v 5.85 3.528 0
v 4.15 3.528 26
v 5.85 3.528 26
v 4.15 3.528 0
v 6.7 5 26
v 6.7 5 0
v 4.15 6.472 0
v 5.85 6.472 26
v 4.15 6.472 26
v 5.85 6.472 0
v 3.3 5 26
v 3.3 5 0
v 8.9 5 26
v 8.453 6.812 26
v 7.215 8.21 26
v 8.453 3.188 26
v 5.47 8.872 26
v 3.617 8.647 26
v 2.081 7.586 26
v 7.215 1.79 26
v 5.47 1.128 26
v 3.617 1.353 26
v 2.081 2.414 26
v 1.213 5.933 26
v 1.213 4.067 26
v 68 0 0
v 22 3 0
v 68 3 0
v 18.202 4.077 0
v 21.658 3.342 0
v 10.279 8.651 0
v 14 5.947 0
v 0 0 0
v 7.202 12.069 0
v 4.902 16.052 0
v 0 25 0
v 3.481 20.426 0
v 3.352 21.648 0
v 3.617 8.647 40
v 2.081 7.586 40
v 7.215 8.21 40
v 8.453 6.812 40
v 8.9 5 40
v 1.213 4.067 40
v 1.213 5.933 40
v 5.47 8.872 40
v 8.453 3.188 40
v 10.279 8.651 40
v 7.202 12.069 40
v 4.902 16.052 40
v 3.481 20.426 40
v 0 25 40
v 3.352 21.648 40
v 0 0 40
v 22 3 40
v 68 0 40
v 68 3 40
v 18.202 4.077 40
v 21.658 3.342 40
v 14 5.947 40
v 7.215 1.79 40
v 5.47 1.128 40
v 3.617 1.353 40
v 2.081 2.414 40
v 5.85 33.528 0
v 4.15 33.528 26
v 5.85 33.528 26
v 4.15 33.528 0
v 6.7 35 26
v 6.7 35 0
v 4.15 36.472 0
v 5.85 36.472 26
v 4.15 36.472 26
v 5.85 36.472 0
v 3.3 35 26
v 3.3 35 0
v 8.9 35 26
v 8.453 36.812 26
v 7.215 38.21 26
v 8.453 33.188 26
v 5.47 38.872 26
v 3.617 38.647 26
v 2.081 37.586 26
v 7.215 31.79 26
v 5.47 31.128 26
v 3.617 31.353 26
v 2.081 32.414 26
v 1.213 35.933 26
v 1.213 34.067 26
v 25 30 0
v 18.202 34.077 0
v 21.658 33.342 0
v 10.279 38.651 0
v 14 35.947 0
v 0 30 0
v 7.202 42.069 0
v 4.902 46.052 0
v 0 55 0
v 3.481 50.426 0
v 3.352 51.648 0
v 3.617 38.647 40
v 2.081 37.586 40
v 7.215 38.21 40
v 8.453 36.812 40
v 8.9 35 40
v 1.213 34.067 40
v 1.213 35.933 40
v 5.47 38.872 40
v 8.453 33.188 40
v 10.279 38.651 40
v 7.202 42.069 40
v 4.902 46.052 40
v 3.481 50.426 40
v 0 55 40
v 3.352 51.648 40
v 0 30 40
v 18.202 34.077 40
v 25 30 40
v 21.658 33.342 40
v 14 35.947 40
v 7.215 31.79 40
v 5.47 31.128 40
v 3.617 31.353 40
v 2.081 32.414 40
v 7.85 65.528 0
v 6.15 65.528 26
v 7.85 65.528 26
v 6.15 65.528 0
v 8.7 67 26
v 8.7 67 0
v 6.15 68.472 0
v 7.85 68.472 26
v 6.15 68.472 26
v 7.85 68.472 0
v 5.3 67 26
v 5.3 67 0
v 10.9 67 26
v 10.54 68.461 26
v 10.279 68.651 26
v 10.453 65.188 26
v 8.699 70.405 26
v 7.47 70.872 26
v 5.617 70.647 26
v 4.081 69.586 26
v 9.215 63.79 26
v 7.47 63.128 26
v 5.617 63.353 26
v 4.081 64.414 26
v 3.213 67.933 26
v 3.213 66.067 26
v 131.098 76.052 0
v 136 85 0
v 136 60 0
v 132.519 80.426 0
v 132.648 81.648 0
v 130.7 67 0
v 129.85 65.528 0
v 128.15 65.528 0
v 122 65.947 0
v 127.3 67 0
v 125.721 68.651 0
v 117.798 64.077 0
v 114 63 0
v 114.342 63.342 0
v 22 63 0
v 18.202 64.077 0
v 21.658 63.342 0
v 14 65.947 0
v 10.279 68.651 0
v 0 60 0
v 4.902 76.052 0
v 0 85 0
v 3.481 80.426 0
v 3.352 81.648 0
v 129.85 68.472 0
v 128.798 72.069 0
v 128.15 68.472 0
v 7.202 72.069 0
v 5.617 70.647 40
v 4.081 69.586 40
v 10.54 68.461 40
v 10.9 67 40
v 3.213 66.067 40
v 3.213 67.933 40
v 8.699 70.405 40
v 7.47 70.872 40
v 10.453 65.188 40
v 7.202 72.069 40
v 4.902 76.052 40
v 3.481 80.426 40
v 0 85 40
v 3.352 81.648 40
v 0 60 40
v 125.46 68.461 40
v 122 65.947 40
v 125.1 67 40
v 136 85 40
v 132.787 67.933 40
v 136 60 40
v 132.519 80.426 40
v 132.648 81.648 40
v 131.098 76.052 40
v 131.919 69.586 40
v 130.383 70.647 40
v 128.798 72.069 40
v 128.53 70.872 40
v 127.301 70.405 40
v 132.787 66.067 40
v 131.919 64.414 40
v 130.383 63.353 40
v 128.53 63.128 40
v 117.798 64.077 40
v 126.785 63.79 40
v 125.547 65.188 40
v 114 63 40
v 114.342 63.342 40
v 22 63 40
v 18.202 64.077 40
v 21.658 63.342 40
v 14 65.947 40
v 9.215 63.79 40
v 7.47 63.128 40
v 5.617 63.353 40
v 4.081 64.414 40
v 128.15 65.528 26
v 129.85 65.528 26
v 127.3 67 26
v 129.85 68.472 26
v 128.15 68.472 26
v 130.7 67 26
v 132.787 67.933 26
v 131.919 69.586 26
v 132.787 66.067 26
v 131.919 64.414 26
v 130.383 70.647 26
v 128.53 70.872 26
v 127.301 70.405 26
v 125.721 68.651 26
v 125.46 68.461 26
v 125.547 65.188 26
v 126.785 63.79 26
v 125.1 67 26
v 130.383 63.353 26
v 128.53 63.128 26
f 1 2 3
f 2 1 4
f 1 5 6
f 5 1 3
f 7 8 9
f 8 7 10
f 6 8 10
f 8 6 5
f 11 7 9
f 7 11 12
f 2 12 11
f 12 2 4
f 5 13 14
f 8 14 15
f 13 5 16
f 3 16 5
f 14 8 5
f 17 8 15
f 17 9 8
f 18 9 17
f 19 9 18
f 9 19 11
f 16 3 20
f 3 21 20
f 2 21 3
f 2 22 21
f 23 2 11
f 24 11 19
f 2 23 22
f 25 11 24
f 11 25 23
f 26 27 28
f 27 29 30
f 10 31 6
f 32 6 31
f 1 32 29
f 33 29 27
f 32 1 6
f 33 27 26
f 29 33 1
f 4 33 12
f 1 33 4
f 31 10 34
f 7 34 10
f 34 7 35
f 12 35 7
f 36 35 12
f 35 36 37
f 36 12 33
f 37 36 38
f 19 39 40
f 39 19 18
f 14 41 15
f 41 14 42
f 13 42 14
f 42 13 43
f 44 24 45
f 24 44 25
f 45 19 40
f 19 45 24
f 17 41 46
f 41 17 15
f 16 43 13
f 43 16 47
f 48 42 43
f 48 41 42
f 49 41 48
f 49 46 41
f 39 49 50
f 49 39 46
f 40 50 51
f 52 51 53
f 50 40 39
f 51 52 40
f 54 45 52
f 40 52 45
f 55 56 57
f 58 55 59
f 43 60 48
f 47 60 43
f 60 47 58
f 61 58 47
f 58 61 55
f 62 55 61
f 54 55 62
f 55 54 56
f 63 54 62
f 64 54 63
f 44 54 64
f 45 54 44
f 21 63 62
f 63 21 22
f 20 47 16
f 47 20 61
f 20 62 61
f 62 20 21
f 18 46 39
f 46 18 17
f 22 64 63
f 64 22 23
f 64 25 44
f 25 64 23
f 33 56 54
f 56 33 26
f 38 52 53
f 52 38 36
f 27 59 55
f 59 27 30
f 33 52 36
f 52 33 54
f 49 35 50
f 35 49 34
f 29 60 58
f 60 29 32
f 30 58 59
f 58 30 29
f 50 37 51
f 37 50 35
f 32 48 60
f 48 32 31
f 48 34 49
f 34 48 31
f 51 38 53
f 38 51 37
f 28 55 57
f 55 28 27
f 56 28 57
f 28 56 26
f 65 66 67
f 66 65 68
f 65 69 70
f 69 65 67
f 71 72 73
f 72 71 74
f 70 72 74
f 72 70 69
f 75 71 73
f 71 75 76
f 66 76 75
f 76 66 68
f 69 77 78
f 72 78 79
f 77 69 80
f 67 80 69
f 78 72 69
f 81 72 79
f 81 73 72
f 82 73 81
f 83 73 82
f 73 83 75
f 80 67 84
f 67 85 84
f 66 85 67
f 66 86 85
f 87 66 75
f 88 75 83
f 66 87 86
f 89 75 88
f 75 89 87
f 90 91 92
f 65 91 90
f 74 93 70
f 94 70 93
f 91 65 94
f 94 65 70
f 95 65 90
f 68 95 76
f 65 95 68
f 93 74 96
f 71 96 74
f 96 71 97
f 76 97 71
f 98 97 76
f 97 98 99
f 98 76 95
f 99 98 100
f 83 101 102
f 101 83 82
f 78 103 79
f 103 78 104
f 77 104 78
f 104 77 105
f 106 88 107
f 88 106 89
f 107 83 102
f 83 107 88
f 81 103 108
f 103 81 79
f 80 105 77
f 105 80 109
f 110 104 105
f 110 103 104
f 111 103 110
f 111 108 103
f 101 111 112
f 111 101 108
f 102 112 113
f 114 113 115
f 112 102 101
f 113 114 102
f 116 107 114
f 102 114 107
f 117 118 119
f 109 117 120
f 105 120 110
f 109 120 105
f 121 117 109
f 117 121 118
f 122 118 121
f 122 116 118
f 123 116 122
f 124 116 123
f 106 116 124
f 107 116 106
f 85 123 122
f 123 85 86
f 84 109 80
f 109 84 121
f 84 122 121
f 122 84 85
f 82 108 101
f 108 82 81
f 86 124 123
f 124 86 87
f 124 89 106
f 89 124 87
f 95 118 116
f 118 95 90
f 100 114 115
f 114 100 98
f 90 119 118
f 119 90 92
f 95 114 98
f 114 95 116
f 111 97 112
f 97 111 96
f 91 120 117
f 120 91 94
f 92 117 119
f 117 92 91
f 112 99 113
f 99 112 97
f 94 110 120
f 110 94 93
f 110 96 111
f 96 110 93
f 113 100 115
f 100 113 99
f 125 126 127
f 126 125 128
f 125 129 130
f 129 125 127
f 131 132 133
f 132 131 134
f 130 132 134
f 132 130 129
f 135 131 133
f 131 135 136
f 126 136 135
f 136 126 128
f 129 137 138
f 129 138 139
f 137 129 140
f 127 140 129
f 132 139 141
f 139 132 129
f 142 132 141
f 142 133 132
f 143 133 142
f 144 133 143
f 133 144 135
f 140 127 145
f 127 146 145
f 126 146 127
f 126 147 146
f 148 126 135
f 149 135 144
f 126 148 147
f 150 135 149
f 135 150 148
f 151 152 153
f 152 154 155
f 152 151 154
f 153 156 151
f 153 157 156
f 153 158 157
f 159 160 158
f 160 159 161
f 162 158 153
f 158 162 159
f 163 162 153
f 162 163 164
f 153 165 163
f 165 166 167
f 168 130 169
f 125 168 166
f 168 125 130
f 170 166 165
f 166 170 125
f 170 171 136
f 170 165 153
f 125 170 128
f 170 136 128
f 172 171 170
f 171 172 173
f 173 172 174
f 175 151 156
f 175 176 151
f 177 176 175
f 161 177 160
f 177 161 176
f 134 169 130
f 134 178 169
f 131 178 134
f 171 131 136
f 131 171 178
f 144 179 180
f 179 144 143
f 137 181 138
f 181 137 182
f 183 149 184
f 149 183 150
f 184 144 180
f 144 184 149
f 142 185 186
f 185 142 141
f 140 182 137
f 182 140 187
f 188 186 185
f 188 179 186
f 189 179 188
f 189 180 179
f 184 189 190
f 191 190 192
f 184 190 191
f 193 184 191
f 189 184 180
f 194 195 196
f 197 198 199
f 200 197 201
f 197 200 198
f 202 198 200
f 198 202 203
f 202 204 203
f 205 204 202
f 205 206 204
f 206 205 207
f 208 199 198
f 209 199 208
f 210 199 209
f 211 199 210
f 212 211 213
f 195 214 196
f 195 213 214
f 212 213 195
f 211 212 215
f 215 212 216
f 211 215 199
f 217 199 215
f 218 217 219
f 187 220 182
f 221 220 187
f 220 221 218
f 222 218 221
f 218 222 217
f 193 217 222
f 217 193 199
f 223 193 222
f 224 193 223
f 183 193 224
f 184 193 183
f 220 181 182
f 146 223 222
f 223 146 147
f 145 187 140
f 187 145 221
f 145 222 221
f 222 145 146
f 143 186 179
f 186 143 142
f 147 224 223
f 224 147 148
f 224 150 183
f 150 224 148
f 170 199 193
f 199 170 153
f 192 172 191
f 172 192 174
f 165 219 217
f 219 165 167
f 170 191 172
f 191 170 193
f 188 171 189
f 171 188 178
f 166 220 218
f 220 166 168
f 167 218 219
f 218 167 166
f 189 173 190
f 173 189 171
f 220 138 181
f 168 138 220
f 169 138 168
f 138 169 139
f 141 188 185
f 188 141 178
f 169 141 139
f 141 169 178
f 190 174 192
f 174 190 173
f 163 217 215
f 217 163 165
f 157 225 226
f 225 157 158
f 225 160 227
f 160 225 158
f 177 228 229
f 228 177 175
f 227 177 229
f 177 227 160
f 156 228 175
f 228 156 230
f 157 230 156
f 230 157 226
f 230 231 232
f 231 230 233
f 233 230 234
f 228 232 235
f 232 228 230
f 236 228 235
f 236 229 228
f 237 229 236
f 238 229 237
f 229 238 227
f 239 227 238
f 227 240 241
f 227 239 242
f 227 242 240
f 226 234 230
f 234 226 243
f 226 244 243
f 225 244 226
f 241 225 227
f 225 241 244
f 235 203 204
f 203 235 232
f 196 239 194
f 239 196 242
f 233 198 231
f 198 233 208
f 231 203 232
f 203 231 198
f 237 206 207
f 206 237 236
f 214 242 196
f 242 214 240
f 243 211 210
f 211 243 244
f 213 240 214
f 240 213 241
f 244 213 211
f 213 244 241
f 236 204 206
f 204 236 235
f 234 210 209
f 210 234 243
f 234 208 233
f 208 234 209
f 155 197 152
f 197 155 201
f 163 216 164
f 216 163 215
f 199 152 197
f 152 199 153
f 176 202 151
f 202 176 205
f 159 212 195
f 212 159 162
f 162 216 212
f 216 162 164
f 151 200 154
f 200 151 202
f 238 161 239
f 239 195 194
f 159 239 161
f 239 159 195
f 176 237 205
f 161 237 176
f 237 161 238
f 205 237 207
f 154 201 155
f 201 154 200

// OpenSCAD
// file: fantools.scad
module fan_corner(height=40, screw_height=26, screw_diameter=3.4, screw_head_diameter=7.8, hole_offset=5, outside_wall_length=25, inner_cutout_r=22, fan_mounts=false){
  difference(){
    linear_extrude(height=height){
      polygon(points=[[0,0],[outside_wall_length,0],[0,outside_wall_length]], paths=[[0,1,2]],convexity=10);
    }
    translate([hole_offset, hole_offset, 0]){
      cylinder(r=screw_diameter/2,h=screw_height);
      translate([0,0,screw_height]){
        cylinder(r=screw_head_diameter/2,height-screw_height);
      }
    }
    translate([outside_wall_length,outside_wall_length,0]){
      cylinder(r=inner_cutout_r,h=height);
    }
  }
  if (fan_mounts == true){
    translate([hole_offset, hole_offset, -4]){
      cylinder(r=2.2,h=6);
    }
  }
}

// this builds supports for one corner with a wall section to the
// middle of the radiator
module fan_corner_support(height=40, screw_height=26, screw_diameter=3.4, screw_head_diameter=7.8, hole_offset=5, hole_distance=136, outside_wall_length=25, wall_width=3, inner_cutout_r=22){
  fan_corner(height, screw_height, screw_diameter, screw_head_diameter, hole_offset, outside_wall_length, inner_cutout_r);
  translate([hole_offset+screw_head_diameter,0,0]){
    linear_extrude(height=height){
      square(size=[hole_distance/2-hole_offset-screw_head_diameter,wall_width], center=false);
    }
  }
}

// this just mirrors and moves a second corner support, generating a full
// leg mountable on two corners with a thin wall, suitable for the legs
// left and right of the radiator
module fan_side_support(height=40, screw_height=26, screw_diameter=3.4, screw_head_diameter=7.8, hole_offset=5, hole_distance=136, outside_wall_length=25, wall_width=3, inner_cutout_r=22){
  fan_corner_support(height, screw_height, screw_diameter, screw_head_diameter, hole_offset, hole_distance, outside_wall_length, wall_width, inner_cutout_r);

  translate([hole_distance,0,0]){
    mirror([1,0,0]){fan_corner_support(height, screw_height, screw_diameter, screw_head_diameter, hole_offset, hole_distance, outside_wall_length, wall_width, inner_cutout_r);}
  }
}
// main file
include <fantools.scad>

height=20;
fan_corner_support();
translate([0,30,0])fan_corner();
translate([0,60,0])fan_side_support(hole_offset=7);
